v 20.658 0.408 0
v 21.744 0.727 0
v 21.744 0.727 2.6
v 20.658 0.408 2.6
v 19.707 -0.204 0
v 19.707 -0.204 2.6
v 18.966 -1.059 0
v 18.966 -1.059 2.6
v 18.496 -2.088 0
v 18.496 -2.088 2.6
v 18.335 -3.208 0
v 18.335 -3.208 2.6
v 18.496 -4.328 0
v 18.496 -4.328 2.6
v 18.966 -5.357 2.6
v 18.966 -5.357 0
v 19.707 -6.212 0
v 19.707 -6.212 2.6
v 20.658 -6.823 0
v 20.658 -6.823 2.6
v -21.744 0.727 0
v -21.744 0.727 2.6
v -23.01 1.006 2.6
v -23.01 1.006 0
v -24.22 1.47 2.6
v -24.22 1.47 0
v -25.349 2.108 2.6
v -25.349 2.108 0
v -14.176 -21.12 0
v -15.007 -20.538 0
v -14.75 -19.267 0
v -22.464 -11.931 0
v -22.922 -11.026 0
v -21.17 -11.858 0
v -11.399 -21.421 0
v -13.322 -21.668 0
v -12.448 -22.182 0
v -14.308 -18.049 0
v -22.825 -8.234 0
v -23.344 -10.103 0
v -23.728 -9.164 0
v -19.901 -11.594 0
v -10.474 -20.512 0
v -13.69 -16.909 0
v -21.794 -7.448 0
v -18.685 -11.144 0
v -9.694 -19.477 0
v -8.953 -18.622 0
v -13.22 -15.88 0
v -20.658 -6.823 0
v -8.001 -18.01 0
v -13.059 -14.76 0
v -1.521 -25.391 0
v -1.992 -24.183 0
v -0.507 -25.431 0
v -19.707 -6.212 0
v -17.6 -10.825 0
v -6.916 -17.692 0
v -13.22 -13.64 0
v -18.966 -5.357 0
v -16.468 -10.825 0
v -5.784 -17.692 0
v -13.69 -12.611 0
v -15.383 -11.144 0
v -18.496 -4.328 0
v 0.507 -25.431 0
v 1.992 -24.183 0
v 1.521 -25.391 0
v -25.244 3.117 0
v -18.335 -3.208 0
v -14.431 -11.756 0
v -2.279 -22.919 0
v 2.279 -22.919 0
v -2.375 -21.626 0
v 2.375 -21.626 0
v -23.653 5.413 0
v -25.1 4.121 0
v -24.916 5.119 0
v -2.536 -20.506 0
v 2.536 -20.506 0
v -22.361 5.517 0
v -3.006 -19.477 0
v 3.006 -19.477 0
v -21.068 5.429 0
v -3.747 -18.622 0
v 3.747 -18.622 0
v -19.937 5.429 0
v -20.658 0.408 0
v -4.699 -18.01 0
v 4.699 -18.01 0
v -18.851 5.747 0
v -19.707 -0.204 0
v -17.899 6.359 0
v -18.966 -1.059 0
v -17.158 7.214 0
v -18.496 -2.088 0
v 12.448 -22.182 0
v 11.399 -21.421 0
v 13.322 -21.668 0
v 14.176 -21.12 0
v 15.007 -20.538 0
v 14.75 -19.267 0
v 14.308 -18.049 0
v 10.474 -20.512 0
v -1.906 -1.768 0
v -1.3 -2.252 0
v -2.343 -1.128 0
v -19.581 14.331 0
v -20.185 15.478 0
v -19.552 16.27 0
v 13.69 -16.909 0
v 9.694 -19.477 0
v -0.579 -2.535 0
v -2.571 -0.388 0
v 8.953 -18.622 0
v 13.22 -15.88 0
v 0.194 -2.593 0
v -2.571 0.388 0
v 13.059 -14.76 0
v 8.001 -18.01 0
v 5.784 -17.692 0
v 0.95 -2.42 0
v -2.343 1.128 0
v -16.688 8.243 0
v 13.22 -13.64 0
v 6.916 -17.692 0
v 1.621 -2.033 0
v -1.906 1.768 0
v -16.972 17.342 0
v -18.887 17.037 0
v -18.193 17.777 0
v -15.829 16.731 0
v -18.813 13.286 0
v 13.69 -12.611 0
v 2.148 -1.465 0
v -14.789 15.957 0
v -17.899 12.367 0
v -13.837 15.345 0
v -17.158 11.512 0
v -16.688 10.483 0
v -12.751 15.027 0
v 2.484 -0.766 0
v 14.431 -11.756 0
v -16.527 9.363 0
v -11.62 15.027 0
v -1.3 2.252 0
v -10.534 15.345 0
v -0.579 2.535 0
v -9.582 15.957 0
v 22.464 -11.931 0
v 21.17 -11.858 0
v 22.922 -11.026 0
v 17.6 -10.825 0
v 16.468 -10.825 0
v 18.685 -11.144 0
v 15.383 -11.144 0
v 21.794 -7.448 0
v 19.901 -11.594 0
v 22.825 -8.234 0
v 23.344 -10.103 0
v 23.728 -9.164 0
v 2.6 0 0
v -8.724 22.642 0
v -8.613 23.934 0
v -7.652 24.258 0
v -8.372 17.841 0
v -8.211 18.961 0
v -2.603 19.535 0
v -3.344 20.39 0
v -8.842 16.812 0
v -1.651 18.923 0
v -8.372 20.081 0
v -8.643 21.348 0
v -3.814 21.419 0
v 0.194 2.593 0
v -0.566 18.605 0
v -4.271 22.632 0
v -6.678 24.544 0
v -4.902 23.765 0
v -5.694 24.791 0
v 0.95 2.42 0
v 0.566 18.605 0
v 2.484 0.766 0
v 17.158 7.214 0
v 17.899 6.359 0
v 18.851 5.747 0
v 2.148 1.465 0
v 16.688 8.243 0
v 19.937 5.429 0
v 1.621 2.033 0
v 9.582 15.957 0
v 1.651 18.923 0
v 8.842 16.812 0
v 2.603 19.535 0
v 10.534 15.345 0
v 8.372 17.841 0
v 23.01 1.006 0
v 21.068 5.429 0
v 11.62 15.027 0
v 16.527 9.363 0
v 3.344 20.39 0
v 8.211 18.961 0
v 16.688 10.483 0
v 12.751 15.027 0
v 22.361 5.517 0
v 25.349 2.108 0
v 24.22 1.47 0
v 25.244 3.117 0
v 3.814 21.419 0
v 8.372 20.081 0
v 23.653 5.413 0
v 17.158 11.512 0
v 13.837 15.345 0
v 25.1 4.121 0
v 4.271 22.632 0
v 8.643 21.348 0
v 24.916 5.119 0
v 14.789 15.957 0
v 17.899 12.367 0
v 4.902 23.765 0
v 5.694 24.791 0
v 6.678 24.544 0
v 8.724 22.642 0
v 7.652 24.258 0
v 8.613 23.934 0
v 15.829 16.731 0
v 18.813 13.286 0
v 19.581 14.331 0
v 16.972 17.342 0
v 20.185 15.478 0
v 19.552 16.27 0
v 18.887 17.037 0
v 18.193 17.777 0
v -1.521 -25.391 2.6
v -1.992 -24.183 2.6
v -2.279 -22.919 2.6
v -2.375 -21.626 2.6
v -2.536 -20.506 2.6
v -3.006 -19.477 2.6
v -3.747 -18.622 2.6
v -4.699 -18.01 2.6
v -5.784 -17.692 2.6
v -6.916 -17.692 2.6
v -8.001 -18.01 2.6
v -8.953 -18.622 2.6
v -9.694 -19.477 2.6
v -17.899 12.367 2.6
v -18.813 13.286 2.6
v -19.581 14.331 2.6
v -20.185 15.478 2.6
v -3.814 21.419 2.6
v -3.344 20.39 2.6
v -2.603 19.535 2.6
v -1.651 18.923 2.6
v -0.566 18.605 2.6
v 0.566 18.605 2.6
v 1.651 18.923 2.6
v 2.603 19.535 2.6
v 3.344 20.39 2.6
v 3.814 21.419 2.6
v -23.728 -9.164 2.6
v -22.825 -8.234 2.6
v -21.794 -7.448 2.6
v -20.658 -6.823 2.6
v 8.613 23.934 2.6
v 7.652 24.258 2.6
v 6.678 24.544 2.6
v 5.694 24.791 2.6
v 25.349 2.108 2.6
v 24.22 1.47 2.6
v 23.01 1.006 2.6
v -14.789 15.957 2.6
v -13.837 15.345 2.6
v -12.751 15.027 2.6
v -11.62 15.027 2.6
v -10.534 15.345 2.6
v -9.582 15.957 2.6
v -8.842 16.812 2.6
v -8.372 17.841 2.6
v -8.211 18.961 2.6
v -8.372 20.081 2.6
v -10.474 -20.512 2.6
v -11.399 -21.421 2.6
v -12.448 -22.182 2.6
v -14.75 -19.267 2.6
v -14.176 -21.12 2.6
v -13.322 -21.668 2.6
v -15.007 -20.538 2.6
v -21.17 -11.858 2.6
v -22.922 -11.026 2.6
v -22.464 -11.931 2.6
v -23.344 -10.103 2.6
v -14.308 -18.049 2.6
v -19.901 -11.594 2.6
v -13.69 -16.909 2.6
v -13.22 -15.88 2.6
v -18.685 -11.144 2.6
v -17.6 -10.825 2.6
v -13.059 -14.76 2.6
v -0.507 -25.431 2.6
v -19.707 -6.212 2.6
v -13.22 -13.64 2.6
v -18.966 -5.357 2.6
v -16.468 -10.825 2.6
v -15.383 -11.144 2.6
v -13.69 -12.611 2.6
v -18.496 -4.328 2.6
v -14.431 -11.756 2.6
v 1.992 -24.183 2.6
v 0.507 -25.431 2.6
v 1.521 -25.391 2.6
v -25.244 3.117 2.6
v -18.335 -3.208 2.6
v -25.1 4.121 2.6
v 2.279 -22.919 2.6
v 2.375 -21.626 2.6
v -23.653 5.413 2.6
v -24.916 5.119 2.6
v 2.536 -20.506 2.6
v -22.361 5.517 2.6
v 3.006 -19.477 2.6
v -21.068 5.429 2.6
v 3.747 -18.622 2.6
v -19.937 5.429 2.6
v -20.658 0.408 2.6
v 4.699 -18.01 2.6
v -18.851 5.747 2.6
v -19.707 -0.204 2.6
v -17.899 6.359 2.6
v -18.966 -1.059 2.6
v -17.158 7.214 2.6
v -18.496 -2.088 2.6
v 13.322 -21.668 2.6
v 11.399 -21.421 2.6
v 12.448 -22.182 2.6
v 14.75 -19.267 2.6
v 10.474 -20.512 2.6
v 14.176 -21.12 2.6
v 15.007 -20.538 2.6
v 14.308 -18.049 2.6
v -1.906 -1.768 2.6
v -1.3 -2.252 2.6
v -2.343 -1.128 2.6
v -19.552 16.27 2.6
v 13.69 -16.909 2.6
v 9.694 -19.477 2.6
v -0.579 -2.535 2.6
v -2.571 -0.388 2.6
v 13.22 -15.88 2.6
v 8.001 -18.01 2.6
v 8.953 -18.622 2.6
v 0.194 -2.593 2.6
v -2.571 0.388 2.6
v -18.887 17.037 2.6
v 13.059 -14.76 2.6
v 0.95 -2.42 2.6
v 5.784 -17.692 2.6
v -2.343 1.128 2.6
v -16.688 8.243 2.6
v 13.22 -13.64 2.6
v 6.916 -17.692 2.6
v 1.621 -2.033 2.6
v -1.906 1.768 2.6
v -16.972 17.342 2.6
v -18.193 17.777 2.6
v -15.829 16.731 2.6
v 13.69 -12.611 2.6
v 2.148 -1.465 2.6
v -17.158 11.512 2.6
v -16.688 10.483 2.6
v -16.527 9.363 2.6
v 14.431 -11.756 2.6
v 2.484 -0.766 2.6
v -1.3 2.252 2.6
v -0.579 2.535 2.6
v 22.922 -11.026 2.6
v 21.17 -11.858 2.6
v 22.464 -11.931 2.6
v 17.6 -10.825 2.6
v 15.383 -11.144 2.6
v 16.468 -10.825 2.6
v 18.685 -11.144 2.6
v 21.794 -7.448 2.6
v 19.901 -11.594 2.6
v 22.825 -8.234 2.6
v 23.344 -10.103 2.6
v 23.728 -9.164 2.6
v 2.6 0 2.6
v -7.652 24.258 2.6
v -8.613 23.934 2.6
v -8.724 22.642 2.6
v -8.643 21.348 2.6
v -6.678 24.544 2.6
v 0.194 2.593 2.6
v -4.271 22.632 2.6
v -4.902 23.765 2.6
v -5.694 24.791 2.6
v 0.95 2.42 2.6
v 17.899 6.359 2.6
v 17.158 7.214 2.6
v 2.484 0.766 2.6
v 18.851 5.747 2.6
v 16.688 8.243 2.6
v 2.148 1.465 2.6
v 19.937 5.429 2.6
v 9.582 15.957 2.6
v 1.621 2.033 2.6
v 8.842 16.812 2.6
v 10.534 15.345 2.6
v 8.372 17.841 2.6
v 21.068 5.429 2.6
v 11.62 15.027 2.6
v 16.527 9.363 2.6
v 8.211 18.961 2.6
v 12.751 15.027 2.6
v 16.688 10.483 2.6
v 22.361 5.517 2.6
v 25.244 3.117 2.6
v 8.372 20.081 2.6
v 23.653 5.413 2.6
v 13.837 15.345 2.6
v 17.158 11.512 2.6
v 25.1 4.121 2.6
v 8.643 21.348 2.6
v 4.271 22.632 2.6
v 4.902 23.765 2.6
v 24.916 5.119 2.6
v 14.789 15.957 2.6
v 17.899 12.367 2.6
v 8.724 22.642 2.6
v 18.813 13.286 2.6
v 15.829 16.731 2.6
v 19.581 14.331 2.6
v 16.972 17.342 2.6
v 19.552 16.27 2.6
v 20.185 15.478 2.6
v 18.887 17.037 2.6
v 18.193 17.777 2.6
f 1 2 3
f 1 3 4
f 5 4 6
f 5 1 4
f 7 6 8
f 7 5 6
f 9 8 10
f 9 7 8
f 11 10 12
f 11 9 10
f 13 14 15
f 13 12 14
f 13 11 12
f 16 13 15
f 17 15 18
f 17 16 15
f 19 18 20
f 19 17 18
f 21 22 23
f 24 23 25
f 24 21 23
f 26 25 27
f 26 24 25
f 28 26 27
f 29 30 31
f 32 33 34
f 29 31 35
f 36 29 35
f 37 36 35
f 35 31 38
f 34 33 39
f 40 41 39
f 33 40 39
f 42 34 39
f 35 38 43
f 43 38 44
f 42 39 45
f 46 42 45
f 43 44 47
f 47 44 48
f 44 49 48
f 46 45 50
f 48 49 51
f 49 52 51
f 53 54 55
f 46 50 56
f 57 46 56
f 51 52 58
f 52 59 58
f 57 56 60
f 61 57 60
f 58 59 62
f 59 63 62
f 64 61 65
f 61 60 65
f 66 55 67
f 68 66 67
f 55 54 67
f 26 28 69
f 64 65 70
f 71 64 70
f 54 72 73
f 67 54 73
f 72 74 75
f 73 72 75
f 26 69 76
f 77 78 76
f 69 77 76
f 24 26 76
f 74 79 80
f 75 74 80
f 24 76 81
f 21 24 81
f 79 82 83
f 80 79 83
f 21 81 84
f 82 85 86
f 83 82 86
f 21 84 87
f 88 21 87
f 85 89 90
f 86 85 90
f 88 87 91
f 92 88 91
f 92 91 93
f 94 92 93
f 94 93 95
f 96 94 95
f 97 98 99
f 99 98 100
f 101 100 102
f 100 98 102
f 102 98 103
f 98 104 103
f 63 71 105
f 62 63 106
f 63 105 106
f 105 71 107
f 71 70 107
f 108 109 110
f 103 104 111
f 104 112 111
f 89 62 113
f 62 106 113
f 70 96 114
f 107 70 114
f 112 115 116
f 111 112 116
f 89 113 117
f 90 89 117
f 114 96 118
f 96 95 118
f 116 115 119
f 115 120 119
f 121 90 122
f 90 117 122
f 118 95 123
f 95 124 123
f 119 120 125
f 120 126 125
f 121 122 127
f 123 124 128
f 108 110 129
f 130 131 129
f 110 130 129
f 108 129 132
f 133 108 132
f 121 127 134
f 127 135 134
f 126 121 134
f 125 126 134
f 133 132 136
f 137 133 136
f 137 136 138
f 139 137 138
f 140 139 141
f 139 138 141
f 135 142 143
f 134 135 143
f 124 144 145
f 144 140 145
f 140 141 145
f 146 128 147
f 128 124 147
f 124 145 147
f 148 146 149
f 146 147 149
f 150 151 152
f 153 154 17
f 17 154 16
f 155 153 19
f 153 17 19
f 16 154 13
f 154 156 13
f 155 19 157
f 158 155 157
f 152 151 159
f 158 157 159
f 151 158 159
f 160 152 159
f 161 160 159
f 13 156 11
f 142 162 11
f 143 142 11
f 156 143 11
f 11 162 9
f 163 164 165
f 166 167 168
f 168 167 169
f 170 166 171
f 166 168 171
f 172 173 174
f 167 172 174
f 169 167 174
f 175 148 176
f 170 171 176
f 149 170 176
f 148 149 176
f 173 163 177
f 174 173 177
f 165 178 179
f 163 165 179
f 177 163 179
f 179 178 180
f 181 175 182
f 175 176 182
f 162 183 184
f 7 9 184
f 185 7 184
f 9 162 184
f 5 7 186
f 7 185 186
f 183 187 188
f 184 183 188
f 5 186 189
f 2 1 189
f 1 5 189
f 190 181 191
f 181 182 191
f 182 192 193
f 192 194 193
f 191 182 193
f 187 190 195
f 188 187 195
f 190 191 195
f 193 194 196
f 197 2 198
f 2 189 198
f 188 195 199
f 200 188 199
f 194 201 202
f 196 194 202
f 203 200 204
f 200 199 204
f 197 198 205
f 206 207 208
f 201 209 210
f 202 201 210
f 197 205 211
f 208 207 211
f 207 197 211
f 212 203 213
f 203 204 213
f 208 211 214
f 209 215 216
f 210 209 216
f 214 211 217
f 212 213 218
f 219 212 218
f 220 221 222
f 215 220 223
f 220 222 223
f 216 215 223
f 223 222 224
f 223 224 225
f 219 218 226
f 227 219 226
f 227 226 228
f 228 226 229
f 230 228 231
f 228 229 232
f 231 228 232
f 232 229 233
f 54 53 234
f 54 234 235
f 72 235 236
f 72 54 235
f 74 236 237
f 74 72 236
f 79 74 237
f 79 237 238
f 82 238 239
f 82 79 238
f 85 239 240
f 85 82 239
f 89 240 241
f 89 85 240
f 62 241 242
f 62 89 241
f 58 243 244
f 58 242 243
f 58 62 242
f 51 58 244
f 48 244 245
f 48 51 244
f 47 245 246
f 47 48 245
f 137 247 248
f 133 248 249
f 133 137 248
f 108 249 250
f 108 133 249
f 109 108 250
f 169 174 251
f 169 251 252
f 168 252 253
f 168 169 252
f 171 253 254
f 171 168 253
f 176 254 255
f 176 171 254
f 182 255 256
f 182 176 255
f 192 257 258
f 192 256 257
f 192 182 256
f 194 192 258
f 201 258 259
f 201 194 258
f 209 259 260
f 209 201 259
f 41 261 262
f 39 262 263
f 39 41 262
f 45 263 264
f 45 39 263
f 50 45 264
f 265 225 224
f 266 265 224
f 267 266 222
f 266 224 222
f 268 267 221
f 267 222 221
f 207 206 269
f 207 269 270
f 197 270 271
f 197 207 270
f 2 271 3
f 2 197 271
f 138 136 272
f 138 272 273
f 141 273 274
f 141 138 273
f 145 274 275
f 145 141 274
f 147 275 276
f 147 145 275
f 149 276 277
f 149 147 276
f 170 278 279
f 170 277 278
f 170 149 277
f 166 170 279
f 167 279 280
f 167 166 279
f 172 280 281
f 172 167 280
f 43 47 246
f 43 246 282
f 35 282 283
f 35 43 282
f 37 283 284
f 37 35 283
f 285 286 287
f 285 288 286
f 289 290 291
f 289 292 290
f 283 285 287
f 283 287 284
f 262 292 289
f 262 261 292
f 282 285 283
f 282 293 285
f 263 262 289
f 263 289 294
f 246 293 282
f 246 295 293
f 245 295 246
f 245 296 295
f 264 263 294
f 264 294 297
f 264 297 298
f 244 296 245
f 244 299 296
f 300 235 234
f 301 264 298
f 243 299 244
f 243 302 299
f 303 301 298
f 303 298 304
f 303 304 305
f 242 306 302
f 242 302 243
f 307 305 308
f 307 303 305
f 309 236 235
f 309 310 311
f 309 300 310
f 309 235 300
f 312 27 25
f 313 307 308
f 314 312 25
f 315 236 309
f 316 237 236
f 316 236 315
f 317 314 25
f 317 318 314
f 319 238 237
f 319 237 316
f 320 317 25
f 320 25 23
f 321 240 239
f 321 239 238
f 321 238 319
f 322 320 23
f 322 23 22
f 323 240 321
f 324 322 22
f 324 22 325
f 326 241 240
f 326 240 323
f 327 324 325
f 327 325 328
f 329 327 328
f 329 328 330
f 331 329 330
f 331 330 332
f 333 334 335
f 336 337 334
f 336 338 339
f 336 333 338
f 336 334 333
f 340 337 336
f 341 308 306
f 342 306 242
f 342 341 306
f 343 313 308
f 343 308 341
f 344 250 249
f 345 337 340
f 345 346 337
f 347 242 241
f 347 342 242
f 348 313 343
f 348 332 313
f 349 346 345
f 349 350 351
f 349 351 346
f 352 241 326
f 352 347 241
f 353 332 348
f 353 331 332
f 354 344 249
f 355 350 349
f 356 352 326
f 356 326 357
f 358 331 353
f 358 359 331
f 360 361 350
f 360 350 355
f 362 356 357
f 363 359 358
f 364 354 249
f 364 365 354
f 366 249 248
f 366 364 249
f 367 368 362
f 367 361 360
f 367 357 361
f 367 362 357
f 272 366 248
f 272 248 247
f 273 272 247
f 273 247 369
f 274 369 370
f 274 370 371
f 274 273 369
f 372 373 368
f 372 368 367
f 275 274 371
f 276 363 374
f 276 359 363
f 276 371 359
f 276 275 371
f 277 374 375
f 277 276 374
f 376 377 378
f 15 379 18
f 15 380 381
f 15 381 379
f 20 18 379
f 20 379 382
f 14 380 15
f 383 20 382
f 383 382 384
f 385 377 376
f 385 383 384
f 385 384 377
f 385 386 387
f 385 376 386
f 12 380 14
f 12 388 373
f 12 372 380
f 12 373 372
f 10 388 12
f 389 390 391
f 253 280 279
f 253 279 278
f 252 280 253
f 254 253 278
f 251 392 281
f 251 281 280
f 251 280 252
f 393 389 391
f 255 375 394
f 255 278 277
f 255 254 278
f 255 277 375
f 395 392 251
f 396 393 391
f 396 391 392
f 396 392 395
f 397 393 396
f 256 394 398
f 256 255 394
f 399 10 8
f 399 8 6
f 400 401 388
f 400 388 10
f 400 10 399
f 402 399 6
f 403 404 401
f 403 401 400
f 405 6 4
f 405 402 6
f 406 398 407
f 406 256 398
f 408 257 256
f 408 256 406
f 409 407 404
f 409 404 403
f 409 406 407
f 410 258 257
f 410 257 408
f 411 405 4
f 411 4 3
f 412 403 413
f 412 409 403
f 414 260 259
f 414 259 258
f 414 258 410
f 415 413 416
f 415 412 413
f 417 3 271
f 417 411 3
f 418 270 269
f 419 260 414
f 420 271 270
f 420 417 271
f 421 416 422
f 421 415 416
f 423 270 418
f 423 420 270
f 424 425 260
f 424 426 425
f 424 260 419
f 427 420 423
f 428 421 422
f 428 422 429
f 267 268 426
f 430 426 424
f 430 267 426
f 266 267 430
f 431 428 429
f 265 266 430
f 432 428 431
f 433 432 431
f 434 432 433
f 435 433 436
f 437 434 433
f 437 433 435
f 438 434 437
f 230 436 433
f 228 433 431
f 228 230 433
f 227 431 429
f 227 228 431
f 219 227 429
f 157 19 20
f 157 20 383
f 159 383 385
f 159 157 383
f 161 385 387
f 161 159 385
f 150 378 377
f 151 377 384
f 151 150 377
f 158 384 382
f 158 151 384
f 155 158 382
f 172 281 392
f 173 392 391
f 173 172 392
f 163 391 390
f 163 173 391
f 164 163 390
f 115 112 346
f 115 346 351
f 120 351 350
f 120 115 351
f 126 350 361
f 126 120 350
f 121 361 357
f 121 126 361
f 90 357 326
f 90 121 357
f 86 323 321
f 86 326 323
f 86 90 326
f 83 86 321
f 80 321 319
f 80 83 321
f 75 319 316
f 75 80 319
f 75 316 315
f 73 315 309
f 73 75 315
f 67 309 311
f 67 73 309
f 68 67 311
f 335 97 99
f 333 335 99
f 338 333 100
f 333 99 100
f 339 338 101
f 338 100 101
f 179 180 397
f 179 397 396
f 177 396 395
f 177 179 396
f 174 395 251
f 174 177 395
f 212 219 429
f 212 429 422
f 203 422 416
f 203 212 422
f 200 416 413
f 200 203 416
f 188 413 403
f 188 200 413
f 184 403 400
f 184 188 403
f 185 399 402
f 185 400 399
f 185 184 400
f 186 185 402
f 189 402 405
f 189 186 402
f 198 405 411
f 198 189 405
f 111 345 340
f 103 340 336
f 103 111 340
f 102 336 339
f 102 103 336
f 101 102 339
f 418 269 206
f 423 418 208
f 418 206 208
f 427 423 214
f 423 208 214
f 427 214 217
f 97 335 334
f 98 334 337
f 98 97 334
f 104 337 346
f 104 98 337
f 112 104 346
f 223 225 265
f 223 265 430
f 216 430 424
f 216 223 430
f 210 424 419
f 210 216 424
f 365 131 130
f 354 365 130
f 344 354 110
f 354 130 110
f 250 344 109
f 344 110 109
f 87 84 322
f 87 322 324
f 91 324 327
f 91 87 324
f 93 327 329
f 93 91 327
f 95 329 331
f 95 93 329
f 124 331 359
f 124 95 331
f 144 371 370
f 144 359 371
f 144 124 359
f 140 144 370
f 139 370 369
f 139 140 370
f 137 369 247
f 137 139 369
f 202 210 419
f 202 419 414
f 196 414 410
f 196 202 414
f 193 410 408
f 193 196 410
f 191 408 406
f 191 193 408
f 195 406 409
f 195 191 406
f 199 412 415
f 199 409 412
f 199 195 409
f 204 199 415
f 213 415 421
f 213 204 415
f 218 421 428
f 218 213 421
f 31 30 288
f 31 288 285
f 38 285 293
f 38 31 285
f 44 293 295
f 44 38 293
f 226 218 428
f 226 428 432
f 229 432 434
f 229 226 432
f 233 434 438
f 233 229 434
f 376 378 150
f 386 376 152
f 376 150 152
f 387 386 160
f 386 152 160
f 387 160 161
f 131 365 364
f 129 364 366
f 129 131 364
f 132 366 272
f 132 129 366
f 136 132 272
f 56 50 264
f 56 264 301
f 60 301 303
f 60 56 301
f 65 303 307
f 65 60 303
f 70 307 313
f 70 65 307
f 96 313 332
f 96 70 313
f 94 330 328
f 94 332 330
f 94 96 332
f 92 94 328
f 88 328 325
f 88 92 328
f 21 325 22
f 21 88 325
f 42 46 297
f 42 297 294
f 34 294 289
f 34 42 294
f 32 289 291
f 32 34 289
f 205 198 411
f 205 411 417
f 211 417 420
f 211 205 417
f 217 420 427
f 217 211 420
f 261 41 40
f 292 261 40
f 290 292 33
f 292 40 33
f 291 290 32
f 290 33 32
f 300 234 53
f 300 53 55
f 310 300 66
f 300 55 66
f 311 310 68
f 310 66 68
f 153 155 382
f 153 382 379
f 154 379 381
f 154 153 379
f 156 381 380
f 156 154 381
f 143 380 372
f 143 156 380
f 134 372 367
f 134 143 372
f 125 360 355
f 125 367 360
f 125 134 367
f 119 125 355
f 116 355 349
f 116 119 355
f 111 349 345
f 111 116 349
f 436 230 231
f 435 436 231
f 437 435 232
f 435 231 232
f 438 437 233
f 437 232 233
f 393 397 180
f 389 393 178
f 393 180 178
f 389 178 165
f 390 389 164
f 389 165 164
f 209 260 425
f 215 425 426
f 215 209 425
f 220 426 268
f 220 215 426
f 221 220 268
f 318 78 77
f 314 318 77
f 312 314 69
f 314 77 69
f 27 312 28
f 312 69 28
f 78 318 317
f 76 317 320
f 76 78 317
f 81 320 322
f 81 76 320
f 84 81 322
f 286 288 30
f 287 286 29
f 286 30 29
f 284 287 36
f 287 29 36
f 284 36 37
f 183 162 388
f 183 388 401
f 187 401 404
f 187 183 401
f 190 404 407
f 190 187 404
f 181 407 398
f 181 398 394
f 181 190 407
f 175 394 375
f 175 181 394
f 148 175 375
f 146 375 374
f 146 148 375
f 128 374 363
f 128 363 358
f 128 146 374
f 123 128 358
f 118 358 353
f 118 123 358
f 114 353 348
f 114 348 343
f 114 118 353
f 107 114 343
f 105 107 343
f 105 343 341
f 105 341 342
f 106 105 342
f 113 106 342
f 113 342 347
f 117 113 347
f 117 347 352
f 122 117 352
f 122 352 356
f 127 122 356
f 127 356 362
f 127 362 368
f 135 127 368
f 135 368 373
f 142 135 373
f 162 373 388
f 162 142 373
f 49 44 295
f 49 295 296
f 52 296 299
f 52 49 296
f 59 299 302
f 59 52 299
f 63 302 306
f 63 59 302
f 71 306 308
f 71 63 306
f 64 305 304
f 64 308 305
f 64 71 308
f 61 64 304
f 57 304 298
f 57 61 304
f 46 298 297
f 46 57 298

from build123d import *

# Parameters (mm, degrees)
SK_DISCO_R           = 25.436113967
SK_DISCO_R_2         = 2.6
DISCO_DEPTH          = 2.6
HUECO_DIENTE_DEPTH   = 37.065936664
MATRIZ_DIENTES_COUNT = 11


with BuildPart() as part:
    # Sk_Disco → Disco (new body)
    with BuildSketch(Plane.XY):
        Circle(SK_DISCO_R)
        Circle(SK_DISCO_R_2, mode=Mode.SUBTRACT)
    extrude(amount=DISCO_DEPTH)

    # Sk_Hueco → Hueco_diente (cut, through all)
    with BuildSketch(Plane.XY):
        with BuildLine():
            ThreePointArc((-3.81398457, 21.41921922), (0, 18.564106134), (3.81398457, 21.41921922))
            ThreePointArc((3.81398457, 21.41921922), (5.23928173, 24.240764826), (7.576378688, 26.369278253))
            ThreePointArc((7.576378688, 26.369278253), (0, 27.436113967), (-7.576378688, 26.369278253))
            ThreePointArc((-7.576378688, 26.369278253), (-5.23928173, 24.240764826), (-3.81398457, 21.41921922))
        make_face()
    hueco_diente = extrude(amount=HUECO_DIENTE_DEPTH, mode=Mode.SUBTRACT)

    # Matriz_dientes: Hueco_diente ×11 about axis
    matriz_dientes_axis = Axis((0, 0, -0.13), (0, 0, 1))
    for i in range(1, MATRIZ_DIENTES_COUNT):
        add(hueco_diente.rotate(matriz_dientes_axis, i * 360 / MATRIZ_DIENTES_COUNT), mode=Mode.SUBTRACT)


solid = part.part
